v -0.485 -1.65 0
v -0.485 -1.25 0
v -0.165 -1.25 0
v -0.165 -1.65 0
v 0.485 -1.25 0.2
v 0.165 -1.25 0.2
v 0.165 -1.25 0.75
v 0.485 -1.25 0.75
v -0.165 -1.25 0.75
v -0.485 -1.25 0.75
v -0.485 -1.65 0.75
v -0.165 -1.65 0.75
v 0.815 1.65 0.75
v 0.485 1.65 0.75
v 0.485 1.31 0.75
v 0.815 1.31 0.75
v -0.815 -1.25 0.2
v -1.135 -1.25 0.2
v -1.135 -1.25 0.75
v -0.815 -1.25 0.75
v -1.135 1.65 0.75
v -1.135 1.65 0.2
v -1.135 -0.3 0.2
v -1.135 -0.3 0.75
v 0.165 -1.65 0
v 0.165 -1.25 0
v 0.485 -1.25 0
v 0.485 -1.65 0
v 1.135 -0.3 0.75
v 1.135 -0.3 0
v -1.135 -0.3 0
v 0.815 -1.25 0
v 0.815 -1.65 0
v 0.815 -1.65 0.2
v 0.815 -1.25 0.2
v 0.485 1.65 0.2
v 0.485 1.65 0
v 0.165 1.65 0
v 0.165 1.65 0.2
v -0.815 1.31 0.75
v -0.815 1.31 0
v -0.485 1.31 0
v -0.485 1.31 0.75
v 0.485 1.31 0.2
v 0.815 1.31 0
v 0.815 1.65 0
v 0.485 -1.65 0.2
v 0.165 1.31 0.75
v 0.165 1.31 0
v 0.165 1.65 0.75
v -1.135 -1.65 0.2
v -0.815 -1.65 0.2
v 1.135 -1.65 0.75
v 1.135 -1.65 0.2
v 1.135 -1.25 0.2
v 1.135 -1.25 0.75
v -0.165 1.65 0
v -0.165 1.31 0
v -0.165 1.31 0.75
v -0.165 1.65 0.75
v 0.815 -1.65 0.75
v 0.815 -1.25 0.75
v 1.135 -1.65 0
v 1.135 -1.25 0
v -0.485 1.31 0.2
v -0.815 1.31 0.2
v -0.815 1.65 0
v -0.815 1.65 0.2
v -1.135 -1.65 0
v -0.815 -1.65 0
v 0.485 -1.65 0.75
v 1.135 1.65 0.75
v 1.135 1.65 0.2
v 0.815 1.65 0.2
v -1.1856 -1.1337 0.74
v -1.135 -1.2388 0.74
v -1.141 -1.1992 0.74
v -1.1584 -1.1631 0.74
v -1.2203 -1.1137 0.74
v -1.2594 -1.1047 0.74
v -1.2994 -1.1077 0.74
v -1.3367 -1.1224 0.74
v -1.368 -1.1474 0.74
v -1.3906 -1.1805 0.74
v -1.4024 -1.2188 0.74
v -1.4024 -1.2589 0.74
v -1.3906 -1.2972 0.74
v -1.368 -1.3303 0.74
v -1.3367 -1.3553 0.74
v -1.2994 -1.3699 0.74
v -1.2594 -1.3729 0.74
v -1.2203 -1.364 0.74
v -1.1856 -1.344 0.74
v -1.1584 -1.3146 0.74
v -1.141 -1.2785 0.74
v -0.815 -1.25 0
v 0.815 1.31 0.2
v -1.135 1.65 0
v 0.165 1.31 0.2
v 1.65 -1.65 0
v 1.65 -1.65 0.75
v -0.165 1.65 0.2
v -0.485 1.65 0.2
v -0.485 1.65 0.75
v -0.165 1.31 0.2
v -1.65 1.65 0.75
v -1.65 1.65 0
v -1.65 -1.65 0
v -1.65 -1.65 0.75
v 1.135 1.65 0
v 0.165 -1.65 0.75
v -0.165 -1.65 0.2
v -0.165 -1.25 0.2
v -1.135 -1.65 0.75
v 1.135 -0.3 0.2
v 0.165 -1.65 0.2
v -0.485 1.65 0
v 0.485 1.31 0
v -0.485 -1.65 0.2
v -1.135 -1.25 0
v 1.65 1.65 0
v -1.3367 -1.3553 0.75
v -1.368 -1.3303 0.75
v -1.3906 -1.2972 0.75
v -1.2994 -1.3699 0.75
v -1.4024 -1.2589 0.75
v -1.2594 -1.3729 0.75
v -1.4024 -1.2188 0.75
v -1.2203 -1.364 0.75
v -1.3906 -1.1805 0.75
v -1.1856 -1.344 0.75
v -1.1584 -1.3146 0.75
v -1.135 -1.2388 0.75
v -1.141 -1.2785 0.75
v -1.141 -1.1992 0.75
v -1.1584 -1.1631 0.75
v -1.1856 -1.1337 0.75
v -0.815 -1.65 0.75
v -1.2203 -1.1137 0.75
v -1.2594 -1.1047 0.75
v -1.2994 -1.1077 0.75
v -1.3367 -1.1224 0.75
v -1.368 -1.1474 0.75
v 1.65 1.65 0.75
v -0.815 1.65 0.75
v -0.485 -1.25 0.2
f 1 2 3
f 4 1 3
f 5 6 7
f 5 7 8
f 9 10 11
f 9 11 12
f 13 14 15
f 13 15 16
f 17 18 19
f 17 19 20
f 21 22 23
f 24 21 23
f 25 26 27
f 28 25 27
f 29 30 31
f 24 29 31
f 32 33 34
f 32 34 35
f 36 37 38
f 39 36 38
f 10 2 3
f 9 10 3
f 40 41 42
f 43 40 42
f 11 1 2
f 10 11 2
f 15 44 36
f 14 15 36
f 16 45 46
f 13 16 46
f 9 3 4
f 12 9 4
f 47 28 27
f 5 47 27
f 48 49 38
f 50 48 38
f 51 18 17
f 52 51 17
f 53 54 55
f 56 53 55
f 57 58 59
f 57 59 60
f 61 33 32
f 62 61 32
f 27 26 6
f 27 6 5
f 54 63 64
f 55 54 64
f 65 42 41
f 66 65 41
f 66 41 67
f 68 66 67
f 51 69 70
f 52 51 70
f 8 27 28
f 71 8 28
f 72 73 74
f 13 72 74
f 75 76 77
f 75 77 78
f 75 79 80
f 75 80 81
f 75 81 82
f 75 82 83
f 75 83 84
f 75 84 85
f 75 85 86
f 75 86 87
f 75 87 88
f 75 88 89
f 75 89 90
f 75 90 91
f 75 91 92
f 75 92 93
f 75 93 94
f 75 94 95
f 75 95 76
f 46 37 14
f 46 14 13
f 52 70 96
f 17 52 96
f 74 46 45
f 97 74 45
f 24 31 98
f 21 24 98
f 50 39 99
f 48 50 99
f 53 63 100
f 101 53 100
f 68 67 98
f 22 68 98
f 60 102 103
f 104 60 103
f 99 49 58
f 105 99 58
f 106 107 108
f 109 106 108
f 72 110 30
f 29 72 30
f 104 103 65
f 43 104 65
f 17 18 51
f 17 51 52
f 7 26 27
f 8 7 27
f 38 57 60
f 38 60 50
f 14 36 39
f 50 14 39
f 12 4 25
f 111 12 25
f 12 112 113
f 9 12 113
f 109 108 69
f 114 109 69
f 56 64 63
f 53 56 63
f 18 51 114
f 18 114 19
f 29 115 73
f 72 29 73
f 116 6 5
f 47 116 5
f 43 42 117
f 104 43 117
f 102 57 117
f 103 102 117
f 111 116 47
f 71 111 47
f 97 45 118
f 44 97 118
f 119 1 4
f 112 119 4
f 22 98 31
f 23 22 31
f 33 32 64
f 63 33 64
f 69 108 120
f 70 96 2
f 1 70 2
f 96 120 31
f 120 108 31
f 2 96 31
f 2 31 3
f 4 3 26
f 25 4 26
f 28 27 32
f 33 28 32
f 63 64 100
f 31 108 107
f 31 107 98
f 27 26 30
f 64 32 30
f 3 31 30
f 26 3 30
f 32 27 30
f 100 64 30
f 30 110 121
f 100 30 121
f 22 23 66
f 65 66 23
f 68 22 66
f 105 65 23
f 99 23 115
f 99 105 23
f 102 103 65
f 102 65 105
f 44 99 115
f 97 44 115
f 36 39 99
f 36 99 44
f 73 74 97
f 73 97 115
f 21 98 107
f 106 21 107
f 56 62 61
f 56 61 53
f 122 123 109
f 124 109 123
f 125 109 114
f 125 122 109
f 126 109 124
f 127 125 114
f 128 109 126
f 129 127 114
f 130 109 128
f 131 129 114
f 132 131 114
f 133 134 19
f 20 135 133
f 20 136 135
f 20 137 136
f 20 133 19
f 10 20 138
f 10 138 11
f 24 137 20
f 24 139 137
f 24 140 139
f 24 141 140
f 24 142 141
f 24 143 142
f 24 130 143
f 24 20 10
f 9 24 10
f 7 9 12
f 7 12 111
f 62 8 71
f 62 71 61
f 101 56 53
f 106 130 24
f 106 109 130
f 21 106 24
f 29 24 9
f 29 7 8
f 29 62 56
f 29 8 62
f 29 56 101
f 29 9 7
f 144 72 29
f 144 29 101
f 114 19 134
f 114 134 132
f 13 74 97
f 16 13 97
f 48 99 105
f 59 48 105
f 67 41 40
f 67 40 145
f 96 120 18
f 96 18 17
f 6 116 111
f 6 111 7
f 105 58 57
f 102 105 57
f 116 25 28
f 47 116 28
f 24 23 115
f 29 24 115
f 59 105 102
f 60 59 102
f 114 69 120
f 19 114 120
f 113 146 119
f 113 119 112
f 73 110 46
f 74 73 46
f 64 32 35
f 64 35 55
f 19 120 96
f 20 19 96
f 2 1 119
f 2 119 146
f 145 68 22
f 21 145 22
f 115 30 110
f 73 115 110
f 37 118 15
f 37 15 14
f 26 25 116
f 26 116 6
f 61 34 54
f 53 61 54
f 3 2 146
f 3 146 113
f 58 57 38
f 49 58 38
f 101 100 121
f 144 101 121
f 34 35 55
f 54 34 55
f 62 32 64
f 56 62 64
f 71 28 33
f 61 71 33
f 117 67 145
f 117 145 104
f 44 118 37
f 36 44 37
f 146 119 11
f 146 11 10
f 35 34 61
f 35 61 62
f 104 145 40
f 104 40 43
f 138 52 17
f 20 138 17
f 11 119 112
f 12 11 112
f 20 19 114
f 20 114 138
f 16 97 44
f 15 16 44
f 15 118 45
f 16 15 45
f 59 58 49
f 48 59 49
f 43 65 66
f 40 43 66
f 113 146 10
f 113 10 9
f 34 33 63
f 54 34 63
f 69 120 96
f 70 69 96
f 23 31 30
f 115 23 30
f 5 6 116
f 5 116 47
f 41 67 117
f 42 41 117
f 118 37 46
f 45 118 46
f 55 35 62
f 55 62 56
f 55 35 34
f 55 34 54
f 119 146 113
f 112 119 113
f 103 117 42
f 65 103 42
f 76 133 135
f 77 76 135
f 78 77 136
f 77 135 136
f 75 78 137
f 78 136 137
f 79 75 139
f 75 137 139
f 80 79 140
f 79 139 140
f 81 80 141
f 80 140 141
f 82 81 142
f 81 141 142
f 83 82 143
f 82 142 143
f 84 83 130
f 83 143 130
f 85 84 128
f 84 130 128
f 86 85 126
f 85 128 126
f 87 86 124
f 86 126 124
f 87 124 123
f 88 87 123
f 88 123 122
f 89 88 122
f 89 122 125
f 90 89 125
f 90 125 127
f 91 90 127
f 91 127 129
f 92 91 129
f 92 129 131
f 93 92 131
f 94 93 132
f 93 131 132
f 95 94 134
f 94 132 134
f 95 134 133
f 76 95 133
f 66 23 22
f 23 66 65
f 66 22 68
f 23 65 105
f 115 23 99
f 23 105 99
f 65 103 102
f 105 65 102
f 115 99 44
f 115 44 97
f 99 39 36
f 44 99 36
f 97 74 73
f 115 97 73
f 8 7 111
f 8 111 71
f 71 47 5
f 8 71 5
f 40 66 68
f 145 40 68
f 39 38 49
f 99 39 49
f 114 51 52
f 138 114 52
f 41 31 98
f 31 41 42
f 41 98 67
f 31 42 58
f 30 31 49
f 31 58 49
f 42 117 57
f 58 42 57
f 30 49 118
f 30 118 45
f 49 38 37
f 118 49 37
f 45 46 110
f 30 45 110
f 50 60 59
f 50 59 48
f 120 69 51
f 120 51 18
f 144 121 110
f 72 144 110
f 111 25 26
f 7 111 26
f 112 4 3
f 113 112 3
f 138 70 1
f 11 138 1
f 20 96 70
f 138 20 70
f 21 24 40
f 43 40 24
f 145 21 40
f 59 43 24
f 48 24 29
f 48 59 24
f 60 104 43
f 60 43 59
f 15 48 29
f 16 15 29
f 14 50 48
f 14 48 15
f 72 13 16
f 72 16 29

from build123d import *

# Parameters (mm, degrees)
BOSS_EXTRUDE1_DEPTH   = 0.2
SKETCH1_W             = 0.32
SKETCH1_H             = 0.4
BOSS_EXTRUDE1_2_DEPTH = 0.2
BOSS_EXTRUDE1_3_DEPTH = 0.2
BOSS_EXTRUDE1_4_DEPTH = 0.2
BOSS_EXTRUDE1_5_DEPTH = 0.2
BOSS_EXTRUDE4_DEPTH   = 0.75
SKETCH1_5_W           = 0.33
SKETCH1_5_H           = 0.34
BOSS_EXTRUDE4_2_DEPTH = 0.75
BOSS_EXTRUDE4_3_DEPTH = 0.75
BOSS_EXTRUDE4_4_DEPTH = 0.75
BOSS_EXTRUDE7_START   = 0.2
BOSS_EXTRUDE7_DEPTH   = 0.55
SKETCH1_7_W           = 0.32
SKETCH1_7_H           = 0.4
BOSS_EXTRUDE7_2_DEPTH = 0.55
BOSS_EXTRUDE7_3_DEPTH = 0.55
BOSS_EXTRUDE7_4_DEPTH = 0.55
BOSS_EXTRUDE7_5_DEPTH = 0.55
SKETCH3_R             = 0.134470163
CUT_EXTRUDE1_DEPTH    = 0.01


with BuildPart() as part:
    # Sketch1 → Boss-Extrude1 (new body)
    with BuildSketch(Plane.XY):
        Polygon((-0.815, 1.65), (-1.135, 1.65), (-1.135, -0.3), (1.135, -0.3), (1.135, 1.65), (0.815, 1.65), (0.815, 1.31), (0.485, 1.31), (0.485, 1.65), (0.165, 1.65), (0.165, 1.31), (-0.165, 1.31), (-0.165, 1.65), (-0.485, 1.65), (-0.485, 1.31), (-0.815, 1.31), align=None)
    extrude(amount=BOSS_EXTRUDE1_DEPTH)


with BuildPart() as body_2:
    # Sketch1 → Boss-Extrude1 2 (new body)
    with BuildSketch(Plane.XY):
        with Locations((-0.975, -1.45)):
            Rectangle(SKETCH1_W, SKETCH1_H)
    extrude(amount=BOSS_EXTRUDE1_2_DEPTH)


with BuildPart() as body_3:
    # Sketch1 → Boss-Extrude1 3 (new body)
    with BuildSketch(Plane.XY):
        with Locations((-0.325, -1.45)):
            Rectangle(SKETCH1_W, SKETCH1_H)
    extrude(amount=BOSS_EXTRUDE1_3_DEPTH)


with BuildPart() as body_4:
    # Sketch1 → Boss-Extrude1 4 (new body)
    with BuildSketch(Plane.XY):
        with Locations((0.325, -1.45)):
            Rectangle(SKETCH1_W, SKETCH1_H)
    extrude(amount=BOSS_EXTRUDE1_4_DEPTH)


with BuildPart() as body_5:
    # Sketch1 → Boss-Extrude1 5 (new body)
    with BuildSketch(Plane.XY):
        with Locations((0.975, -1.45)):
            Rectangle(SKETCH1_W, SKETCH1_H)
    extrude(amount=BOSS_EXTRUDE1_5_DEPTH)


with BuildPart() as body_6:
    # Sketch1<5> → Boss-Extrude4 (new body)
    with BuildSketch(Plane.XY):
        Polygon((-1.65, 1.65), (-1.65, -1.65), (-1.135, -1.65), (-1.135, -1.25), (-0.815, -1.25), (-0.815, -1.65), (-0.485, -1.65), (-0.485, -1.25), (-0.165, -1.25), (-0.165, -1.65), (0.165, -1.65), (0.165, -1.25), (0.485, -1.25), (0.485, -1.65), (0.815, -1.65), (0.815, -1.25), (1.135, -1.25), (1.135, -1.65), (1.65, -1.65), (1.65, 1.65), (1.135, 1.65), (1.135, -0.3), (-1.135, -0.3), (-1.135, 1.65), align=None)
    extrude(amount=BOSS_EXTRUDE4_DEPTH)

    # Sketch3 → Cut-Extrude1 (cut)
    with BuildSketch(Plane.XY.offset(0.75)):
        with Locations((-1.269470163, -1.23882778)):
            Circle(SKETCH3_R)
    extrude(amount=-CUT_EXTRUDE1_DEPTH, mode=Mode.SUBTRACT)


with BuildPart() as body_7:
    # Sketch1<5> → Boss-Extrude4 2 (new body)
    with BuildSketch(Plane.XY):
        with Locations((0.65, 1.48)):
            Rectangle(SKETCH1_5_W, SKETCH1_5_H)
    extrude(amount=BOSS_EXTRUDE4_2_DEPTH)


with BuildPart() as body_8:
    # Sketch1<5> → Boss-Extrude4 3 (new body)
    with BuildSketch(Plane.XY):
        with Locations((-0.65, 1.48)):
            Rectangle(SKETCH1_5_W, SKETCH1_5_H)
    extrude(amount=BOSS_EXTRUDE4_3_DEPTH)


with BuildPart() as body_9:
    # Sketch1<5> → Boss-Extrude4 4 (new body)
    with BuildSketch(Plane.XY):
        with Locations((0, 1.48)):
            Rectangle(SKETCH1_5_W, SKETCH1_5_H)
    extrude(amount=BOSS_EXTRUDE4_4_DEPTH)


with BuildPart() as body_10:
    # Sketch1<7> → Boss-Extrude7 (new body)
    with BuildSketch(Plane.XY.offset(BOSS_EXTRUDE7_START)):
        Polygon((-0.815, 1.65), (-1.135, 1.65), (-1.135, -0.3), (1.135, -0.3), (1.135, 1.65), (0.815, 1.65), (0.815, 1.31), (0.485, 1.31), (0.485, 1.65), (0.165, 1.65), (0.165, 1.31), (-0.165, 1.31), (-0.165, 1.65), (-0.485, 1.65), (-0.485, 1.31), (-0.815, 1.31), align=None)
    extrude(amount=BOSS_EXTRUDE7_DEPTH)


with BuildPart() as body_11:
    # Sketch1<7> → Boss-Extrude7 2 (new body)
    with BuildSketch(Plane.XY.offset(BOSS_EXTRUDE7_START)):
        with Locations((-0.975, -1.45)):
            Rectangle(SKETCH1_7_W, SKETCH1_7_H)
    extrude(amount=BOSS_EXTRUDE7_2_DEPTH)


with BuildPart() as body_12:
    # Sketch1<7> → Boss-Extrude7 3 (new body)
    with BuildSketch(Plane.XY.offset(BOSS_EXTRUDE7_START)):
        with Locations((-0.325, -1.45)):
            Rectangle(SKETCH1_7_W, SKETCH1_7_H)
    extrude(amount=BOSS_EXTRUDE7_3_DEPTH)


with BuildPart() as body_13:
    # Sketch1<7> → Boss-Extrude7 4 (new body)
    with BuildSketch(Plane.XY.offset(BOSS_EXTRUDE7_START)):
        with Locations((0.325, -1.45)):
            Rectangle(SKETCH1_7_W, SKETCH1_7_H)
    extrude(amount=BOSS_EXTRUDE7_4_DEPTH)


with BuildPart() as body_14:
    # Sketch1<7> → Boss-Extrude7 5 (new body)
    with BuildSketch(Plane.XY.offset(BOSS_EXTRUDE7_START)):
        with Locations((0.975, -1.45)):
            Rectangle(SKETCH1_7_W, SKETCH1_7_H)
    extrude(amount=BOSS_EXTRUDE7_5_DEPTH)


solid = Compound([part.part, body_2.part, body_3.part, body_4.part, body_5.part, body_6.part, body_7.part, body_8.part, body_9.part, body_10.part, body_11.part, body_12.part, body_13.part, body_14.part])
